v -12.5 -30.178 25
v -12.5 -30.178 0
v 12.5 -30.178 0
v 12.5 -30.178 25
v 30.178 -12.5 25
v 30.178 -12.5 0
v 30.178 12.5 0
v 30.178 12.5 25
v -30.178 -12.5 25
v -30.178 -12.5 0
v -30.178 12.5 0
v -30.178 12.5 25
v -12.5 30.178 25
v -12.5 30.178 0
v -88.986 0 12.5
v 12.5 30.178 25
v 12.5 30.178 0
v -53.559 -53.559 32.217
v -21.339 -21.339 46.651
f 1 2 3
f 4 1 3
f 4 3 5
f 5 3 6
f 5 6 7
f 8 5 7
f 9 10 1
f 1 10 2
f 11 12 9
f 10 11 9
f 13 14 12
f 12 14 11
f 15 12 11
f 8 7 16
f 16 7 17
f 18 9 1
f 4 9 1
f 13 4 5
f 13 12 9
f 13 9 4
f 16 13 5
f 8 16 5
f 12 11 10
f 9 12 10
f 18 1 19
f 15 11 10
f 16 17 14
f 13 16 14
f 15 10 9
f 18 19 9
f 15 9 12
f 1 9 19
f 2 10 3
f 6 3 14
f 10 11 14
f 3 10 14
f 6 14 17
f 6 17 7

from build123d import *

# Parameters (mm, degrees)
F1_DEPTH  = 25
F1_FACE_W = 25
F1_FACE_H = 25


# Not quite as in the source:
# - an extrude whose draft closes it to a point is written as a loft to that point


with BuildPart() as f1:
    # F0 (on Top) → F1 (new body)
    with BuildSketch(Plane.XY):
        Polygon((12.5, -30.1776695297), (30.1776695297, -12.5), (30.1776695297, 12.5), (12.5, 30.1776695297), (-12.5, 30.1776695297), (-30.1776695297, 12.5), (-30.1776695297, -12.5), (-12.5, -30.1776695297), align=None)
    extrude(amount=F1_DEPTH)


with BuildPart() as f2:
    # F1_face (on face) → F2 section 0
    with BuildSketch(Plane(origin=(-30.1776695297, 0, 12.5), x_dir=(0, -1, 0), z_dir=(-1, 0, 0)), mode=Mode.PRIVATE) as f2_s0:
        Rectangle(F1_FACE_W, F1_FACE_H)
    loft([f2_s0.sketch, Vertex(-88.9855458981, 0, 12.5)], ruled=True)


with BuildPart() as f4:
    # F3 (on face) → F4 section 0
    with BuildSketch(Plane(origin=(-21.3388347648, -21.3388347648, 0), x_dir=(0.7071067812, -0.7071067812, 0), z_dir=(-0.7071067812, -0.7071067812, 0)), mode=Mode.PRIVATE) as f4_s0:
        Polygon((-12.5, 25), (12.5, 25), (0, 46.6506350946), align=None)
    loft([f4_s0.sketch, Vertex(-53.5585630433, -53.5585630433, 32.2168783649)], ruled=True)


solid = Compound([f1.part, f2.part, f4.part])
